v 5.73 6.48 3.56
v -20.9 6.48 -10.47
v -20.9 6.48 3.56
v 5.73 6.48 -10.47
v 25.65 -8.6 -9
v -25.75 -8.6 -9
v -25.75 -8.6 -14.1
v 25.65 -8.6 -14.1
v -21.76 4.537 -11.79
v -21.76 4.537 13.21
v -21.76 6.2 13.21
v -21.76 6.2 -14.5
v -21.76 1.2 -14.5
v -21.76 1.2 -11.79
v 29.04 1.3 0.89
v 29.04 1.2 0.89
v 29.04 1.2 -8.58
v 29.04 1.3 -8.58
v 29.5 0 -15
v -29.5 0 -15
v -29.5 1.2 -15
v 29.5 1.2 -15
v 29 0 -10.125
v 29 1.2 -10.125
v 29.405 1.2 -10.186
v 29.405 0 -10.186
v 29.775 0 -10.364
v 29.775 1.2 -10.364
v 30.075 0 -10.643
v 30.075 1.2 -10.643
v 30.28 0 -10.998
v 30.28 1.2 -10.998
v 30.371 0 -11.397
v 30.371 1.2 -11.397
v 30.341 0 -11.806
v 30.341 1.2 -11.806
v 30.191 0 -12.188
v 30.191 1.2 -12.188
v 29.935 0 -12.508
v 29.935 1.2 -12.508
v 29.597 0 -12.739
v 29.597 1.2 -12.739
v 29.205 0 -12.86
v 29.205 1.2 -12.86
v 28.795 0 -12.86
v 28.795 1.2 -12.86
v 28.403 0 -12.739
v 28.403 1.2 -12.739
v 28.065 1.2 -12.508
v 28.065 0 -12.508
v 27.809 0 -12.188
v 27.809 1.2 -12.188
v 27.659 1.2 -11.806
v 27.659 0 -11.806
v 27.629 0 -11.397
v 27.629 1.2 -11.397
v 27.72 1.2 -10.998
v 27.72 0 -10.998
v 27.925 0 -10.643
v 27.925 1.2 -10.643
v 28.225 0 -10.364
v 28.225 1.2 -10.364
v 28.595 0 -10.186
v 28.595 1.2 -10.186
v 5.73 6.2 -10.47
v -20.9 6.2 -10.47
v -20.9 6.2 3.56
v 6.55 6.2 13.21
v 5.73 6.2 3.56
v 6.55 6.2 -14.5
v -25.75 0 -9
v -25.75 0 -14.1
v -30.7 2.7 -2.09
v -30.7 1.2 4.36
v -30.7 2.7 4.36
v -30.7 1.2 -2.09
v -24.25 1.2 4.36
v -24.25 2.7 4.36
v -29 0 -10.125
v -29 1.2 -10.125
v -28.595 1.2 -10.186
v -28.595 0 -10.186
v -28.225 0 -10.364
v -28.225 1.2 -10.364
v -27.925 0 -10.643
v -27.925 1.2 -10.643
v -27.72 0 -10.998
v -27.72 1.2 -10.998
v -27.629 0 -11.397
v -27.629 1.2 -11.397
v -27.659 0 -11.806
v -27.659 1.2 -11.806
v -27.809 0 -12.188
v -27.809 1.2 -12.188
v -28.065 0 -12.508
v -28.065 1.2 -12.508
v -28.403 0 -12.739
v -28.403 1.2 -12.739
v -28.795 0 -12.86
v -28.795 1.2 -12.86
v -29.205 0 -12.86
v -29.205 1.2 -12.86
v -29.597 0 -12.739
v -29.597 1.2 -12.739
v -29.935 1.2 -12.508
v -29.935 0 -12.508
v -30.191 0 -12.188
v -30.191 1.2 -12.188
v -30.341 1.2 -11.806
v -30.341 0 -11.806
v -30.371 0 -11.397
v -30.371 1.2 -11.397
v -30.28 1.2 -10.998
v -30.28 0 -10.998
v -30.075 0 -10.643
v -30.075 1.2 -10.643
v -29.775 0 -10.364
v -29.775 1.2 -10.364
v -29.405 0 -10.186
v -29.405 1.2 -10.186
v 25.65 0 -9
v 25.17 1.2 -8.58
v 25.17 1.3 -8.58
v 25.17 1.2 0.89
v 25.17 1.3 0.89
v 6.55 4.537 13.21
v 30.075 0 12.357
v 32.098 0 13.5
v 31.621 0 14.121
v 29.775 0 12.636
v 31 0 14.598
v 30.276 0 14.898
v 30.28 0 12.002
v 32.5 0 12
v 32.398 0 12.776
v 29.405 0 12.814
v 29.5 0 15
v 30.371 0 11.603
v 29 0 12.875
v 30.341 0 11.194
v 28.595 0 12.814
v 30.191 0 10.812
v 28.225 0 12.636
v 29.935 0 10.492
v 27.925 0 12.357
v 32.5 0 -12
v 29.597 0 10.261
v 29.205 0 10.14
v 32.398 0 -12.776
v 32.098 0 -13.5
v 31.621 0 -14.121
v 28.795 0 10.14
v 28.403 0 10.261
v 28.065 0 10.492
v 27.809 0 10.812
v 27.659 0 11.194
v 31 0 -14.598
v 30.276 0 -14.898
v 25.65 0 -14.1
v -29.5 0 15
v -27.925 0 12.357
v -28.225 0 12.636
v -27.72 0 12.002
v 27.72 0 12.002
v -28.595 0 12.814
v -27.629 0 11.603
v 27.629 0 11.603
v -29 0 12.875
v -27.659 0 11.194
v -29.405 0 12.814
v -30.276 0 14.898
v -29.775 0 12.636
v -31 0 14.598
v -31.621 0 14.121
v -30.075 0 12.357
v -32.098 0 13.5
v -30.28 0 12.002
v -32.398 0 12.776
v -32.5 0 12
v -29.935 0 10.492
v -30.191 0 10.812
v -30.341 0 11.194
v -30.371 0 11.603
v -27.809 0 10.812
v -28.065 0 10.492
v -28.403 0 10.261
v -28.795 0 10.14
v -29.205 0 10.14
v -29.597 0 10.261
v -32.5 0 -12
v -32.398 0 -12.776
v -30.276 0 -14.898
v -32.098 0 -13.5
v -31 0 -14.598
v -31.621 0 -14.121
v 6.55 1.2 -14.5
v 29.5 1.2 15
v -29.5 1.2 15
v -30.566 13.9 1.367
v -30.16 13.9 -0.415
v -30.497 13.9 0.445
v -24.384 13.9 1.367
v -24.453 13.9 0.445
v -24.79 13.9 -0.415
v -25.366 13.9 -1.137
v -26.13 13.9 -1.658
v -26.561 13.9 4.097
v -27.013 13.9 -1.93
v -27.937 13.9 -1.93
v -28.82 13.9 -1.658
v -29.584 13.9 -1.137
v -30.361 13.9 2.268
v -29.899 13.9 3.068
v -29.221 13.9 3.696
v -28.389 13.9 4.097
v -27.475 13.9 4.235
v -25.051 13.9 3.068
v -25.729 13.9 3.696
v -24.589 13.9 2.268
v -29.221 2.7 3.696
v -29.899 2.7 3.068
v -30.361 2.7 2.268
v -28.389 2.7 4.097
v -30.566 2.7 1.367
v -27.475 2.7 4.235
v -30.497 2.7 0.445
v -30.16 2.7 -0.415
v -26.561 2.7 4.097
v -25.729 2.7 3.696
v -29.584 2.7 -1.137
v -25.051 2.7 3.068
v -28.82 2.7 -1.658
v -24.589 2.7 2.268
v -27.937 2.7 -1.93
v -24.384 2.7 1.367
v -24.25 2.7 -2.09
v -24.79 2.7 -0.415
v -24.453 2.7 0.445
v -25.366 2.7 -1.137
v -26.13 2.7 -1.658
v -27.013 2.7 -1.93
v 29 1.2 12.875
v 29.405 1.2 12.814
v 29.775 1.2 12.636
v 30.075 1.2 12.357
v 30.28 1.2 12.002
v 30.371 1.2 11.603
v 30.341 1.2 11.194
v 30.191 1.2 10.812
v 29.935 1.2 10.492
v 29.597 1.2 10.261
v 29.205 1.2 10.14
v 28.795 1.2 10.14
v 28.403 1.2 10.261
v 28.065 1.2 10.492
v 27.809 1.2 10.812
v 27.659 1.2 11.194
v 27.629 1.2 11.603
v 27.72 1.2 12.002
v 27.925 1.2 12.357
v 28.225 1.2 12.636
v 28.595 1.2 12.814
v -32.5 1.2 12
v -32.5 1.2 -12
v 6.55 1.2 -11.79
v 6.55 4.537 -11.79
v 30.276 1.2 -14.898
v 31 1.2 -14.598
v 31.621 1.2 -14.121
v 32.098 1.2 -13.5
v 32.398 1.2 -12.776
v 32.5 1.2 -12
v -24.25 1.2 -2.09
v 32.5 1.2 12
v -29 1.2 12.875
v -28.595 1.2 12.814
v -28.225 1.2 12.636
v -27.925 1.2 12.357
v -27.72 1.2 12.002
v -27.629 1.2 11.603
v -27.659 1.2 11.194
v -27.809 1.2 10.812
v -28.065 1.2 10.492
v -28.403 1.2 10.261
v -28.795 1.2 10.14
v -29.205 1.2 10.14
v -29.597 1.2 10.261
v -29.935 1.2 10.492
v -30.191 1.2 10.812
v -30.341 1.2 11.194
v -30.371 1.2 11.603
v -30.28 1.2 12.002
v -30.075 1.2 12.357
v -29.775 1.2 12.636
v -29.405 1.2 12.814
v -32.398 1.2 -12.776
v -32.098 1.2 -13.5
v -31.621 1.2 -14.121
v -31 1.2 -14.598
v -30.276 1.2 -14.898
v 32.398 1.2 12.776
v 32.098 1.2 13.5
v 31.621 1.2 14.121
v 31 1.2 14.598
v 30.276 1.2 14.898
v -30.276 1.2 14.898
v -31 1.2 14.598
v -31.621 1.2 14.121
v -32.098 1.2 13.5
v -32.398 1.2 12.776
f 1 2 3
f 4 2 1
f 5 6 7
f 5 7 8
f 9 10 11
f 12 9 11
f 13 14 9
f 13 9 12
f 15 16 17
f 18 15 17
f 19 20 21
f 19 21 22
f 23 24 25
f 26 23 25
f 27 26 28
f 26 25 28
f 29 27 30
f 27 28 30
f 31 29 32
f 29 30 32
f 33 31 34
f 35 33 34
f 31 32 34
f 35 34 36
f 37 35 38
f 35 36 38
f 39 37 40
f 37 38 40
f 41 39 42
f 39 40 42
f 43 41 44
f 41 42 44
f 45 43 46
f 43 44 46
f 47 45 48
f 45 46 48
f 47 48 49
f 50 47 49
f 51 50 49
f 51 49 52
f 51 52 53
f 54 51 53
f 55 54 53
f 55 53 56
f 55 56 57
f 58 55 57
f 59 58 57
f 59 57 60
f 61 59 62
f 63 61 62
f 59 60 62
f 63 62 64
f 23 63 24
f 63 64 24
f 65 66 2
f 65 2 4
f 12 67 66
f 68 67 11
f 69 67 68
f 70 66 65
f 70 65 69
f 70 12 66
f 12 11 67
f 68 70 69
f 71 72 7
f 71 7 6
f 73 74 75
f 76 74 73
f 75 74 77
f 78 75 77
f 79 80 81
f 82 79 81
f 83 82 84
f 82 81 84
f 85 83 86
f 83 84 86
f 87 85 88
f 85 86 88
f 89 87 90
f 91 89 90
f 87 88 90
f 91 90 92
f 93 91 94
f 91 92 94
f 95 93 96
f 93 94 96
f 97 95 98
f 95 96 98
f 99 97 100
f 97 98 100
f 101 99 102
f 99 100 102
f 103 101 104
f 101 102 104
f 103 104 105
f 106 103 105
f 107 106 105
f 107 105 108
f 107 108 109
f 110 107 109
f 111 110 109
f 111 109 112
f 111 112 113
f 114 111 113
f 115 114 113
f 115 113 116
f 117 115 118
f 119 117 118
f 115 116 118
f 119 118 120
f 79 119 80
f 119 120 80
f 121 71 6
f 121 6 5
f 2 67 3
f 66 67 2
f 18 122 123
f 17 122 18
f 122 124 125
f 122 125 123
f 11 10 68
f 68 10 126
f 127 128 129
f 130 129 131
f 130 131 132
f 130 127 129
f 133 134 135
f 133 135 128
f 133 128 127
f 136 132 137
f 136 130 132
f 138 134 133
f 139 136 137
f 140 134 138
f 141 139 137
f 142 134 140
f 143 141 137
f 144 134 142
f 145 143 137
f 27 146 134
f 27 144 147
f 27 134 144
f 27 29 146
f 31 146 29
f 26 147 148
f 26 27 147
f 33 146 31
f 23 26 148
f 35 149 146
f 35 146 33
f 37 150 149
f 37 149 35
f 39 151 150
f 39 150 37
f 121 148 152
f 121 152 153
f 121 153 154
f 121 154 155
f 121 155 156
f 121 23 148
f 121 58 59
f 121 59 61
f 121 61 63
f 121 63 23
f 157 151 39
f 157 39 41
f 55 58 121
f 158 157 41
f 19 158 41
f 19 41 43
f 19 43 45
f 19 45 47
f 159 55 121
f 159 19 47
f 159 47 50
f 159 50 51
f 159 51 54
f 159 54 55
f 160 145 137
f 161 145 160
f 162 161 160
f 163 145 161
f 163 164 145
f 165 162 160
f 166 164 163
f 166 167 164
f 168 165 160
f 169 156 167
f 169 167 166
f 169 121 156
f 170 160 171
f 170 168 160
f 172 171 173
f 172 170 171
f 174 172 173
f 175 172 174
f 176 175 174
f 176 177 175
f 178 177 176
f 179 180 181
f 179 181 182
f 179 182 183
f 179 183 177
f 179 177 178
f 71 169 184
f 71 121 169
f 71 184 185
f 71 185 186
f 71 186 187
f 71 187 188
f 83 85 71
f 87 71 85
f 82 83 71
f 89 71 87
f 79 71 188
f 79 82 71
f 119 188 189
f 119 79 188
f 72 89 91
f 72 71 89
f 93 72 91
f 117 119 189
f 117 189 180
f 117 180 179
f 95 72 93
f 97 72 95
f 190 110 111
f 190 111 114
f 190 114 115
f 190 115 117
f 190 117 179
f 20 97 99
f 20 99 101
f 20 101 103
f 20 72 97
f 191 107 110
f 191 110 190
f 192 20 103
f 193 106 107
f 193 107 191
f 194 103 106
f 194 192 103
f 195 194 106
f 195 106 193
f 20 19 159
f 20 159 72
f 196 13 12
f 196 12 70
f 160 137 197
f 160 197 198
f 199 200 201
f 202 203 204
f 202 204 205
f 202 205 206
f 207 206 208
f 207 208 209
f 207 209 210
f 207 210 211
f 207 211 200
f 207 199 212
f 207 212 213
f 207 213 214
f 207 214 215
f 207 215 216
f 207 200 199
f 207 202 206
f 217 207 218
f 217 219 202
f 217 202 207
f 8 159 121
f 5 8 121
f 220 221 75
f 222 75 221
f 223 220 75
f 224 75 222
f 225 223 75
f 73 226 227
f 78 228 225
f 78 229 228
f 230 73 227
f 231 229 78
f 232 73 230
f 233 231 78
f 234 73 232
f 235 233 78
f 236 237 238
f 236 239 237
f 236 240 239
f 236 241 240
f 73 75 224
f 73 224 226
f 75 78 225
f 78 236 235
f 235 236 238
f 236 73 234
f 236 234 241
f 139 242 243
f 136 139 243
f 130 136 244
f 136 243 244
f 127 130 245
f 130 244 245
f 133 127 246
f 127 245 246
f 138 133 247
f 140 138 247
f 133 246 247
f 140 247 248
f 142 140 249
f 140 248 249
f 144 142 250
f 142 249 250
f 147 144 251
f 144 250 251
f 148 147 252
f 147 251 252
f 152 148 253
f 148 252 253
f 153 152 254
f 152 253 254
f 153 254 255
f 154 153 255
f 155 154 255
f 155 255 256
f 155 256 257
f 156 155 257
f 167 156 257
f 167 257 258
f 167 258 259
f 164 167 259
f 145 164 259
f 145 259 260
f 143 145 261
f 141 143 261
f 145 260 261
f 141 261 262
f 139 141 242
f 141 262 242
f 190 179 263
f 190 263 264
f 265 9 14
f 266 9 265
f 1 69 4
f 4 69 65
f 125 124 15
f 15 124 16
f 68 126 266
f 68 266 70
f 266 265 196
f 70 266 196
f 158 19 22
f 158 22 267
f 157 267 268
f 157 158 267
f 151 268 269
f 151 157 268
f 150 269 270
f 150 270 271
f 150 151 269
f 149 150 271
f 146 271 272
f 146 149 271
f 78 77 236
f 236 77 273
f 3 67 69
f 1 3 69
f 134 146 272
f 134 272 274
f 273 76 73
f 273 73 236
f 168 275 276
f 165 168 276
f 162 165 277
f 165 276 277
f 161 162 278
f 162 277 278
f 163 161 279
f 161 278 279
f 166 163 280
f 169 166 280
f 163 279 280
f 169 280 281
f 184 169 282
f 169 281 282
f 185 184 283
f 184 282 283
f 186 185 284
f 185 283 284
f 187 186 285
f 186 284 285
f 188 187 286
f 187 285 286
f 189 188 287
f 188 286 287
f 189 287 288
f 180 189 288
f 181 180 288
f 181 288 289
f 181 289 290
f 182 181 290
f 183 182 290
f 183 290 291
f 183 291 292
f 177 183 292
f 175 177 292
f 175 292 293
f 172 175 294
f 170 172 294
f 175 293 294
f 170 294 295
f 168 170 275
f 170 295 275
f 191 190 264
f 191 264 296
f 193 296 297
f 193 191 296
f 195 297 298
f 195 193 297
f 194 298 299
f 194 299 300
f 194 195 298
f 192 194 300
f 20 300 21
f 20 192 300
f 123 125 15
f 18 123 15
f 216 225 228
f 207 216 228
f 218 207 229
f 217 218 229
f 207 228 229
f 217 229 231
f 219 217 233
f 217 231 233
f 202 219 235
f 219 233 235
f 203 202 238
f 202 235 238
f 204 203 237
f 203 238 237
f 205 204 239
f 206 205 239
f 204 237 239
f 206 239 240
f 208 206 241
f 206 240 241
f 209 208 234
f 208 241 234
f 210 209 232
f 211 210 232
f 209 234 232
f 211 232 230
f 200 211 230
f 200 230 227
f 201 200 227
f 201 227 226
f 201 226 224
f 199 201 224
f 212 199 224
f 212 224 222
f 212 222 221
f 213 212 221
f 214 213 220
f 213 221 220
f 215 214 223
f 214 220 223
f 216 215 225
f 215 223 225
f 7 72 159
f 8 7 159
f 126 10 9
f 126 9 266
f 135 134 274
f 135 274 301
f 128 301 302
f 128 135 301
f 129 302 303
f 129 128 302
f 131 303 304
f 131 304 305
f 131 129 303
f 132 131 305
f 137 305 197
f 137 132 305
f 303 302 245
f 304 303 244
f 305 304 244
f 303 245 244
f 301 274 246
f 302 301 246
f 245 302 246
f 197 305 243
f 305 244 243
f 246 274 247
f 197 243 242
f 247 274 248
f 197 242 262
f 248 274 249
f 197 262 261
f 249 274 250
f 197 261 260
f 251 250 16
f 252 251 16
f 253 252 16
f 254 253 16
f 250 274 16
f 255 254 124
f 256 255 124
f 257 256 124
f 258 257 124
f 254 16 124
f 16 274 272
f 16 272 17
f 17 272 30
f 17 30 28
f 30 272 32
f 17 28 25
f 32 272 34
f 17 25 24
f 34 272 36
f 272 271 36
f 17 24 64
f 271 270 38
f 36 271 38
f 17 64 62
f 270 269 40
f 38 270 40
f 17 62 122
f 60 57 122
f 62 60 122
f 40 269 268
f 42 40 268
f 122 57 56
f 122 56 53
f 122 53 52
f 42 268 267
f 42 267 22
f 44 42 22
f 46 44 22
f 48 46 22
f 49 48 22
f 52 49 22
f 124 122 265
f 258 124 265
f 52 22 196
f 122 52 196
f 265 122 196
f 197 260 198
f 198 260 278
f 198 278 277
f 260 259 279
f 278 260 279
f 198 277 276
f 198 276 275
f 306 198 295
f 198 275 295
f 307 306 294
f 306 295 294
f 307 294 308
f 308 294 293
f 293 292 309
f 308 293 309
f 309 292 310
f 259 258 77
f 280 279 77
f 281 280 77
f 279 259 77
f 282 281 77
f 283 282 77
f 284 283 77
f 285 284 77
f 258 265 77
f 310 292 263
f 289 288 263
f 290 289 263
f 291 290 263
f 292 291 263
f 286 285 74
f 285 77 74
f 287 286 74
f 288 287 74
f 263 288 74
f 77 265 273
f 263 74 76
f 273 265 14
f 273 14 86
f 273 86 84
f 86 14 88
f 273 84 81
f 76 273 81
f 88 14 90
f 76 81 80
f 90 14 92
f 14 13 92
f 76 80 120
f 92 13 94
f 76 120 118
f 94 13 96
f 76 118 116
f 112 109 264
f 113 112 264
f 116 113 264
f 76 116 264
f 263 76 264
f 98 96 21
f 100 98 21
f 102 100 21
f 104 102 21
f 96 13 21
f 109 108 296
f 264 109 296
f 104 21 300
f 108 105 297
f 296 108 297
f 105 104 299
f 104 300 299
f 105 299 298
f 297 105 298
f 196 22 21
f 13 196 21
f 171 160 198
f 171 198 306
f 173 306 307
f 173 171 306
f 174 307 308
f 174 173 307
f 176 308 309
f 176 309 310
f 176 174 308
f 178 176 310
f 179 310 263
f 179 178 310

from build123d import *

# Parameters (mm, degrees)
EXTRUDE_1_DEPTH     = 1.2
SKETCH_2_R          = 1.375
CUT_EXTRUDE_1_DEPTH = 1.2
SKETCH_11_W         = 51.4
SKETCH_11_H         = 5.1
EXTRUDE_9_DEPTH     = 8.6
SKETCH_12_W         = 6.45
SKETCH_12_H         = 6.45
EXTRUDE_10_DEPTH    = 1.5
SKETCH_13_R         = 3.1
EXTRUDE_11_DEPTH    = 11.2
SKETCH_14_W         = 28.31
SKETCH_14_H         = 27.71
EXTRUDE_12_DEPTH    = 5
SKETCH_15_W         = 26.63
SKETCH_15_H         = 14.03
EXTRUDE_13_DEPTH    = 0.28
SKETCH_16_W         = 3.87
SKETCH_16_H         = 9.47
EXTRUDE_14_DEPTH    = 0.1
SKETCH_17_W         = 28.31
SKETCH_17_H         = 3.337027264
CUT_EXTRUDE_2_DEPTH = 25


with BuildPart() as part:
    # 草图1 → 凸台-拉伸1 (new body)
    with BuildSketch(Plane(origin=(0, 0, 0), x_dir=(1, 0, 0), z_dir=(0, 1, 0))):
        with BuildLine():
            Line((-29.5, 15), (29.5, 15))
            ThreePointArc((29.5, 15), (31.621320344, 14.121320344), (32.5, 12))
            Line((32.5, 12), (32.5, -12))
            ThreePointArc((32.5, -12), (31.621320344, -14.121320344), (29.5, -15))
            Line((29.5, -15), (-29.5, -15))
            ThreePointArc((-29.5, -15), (-31.621320344, -14.121320344), (-32.5, -12))
            Line((-32.5, -12), (-32.5, 12))
            ThreePointArc((-32.5, 12), (-31.621320344, 14.121320344), (-29.5, 15))
        make_face()
    extrude(amount=EXTRUDE_1_DEPTH)

    # 草图2 → 切除-拉伸1 (cut)
    with BuildSketch(Plane(origin=(0, 1.2, 0), x_dir=(1, 0, 0), z_dir=(0, 1, 0))):
        with Locations(Location((29, -11.5, 0), (0, 0, 270))):
            Circle(SKETCH_2_R)
        with Locations(Location((29, 11.5, 0), (0, 0, 270))):
            Circle(SKETCH_2_R)
        with Locations(Location((-29, -11.5, 0), (0, 0, 270))):
            Circle(SKETCH_2_R)
        with Locations(Location((-29, 11.5, 0), (0, 0, 270))):
            Circle(SKETCH_2_R)
    extrude(amount=-CUT_EXTRUDE_1_DEPTH, mode=Mode.SUBTRACT)

    # 草图11 → 凸台-拉伸9 (add)
    with BuildSketch(Plane.XZ):
        with Locations((-0.05, -11.55)):
            Rectangle(SKETCH_11_W, SKETCH_11_H)
    extrude(amount=EXTRUDE_9_DEPTH)

    # 草图12 → 凸台-拉伸10 (add)
    with BuildSketch(Plane(origin=(0, 1.2, 0), x_dir=(1, 0, 0), z_dir=(0, 1, 0))):
        with Locations((-27.475, -1.135)):
            Rectangle(SKETCH_12_W, SKETCH_12_H)
    extrude(amount=EXTRUDE_10_DEPTH)

    # 草图13 → 凸台-拉伸11 (add)
    with BuildSketch(Plane(origin=(0, 2.7, 0), x_dir=(1, 0, 0), z_dir=(0, 1, 0))):
        with Locations(Location((-27.475, -1.135, 0), (0, 0, 270))):
            Circle(SKETCH_13_R)
    extrude(amount=EXTRUDE_11_DEPTH)

    # 草图14 → 凸台-拉伸12 (add)
    with BuildSketch(Plane(origin=(0, 1.2, 0), x_dir=(1, 0, 0), z_dir=(0, 1, 0))):
        with Locations((-7.605, 0.645)):
            Rectangle(SKETCH_14_W, SKETCH_14_H)
    extrude(amount=EXTRUDE_12_DEPTH)

    # 草图15 → 凸台-拉伸13 (add)
    with BuildSketch(Plane(origin=(0, 6.2, 0), x_dir=(1, 0, 0), z_dir=(0, 1, 0))):
        with Locations((-7.585, 3.455)):
            Rectangle(SKETCH_15_W, SKETCH_15_H)
    extrude(amount=EXTRUDE_13_DEPTH)

    # 草图16 → 凸台-拉伸14 (add)
    with BuildSketch(Plane(origin=(0, 1.2, 0), x_dir=(1, 0, 0), z_dir=(0, 1, 0))):
        with Locations((27.105, 3.845)):
            Rectangle(SKETCH_16_W, SKETCH_16_H)
    extrude(amount=EXTRUDE_14_DEPTH)

    # 草图17 → 切除-拉伸2 (cut)
    with BuildSketch(Plane.XY.offset(13.21)):
        with Locations((-7.605, 2.868513632)):
            Rectangle(SKETCH_17_W, SKETCH_17_H)
    extrude(amount=-CUT_EXTRUDE_2_DEPTH, mode=Mode.SUBTRACT)


solid = part.part
